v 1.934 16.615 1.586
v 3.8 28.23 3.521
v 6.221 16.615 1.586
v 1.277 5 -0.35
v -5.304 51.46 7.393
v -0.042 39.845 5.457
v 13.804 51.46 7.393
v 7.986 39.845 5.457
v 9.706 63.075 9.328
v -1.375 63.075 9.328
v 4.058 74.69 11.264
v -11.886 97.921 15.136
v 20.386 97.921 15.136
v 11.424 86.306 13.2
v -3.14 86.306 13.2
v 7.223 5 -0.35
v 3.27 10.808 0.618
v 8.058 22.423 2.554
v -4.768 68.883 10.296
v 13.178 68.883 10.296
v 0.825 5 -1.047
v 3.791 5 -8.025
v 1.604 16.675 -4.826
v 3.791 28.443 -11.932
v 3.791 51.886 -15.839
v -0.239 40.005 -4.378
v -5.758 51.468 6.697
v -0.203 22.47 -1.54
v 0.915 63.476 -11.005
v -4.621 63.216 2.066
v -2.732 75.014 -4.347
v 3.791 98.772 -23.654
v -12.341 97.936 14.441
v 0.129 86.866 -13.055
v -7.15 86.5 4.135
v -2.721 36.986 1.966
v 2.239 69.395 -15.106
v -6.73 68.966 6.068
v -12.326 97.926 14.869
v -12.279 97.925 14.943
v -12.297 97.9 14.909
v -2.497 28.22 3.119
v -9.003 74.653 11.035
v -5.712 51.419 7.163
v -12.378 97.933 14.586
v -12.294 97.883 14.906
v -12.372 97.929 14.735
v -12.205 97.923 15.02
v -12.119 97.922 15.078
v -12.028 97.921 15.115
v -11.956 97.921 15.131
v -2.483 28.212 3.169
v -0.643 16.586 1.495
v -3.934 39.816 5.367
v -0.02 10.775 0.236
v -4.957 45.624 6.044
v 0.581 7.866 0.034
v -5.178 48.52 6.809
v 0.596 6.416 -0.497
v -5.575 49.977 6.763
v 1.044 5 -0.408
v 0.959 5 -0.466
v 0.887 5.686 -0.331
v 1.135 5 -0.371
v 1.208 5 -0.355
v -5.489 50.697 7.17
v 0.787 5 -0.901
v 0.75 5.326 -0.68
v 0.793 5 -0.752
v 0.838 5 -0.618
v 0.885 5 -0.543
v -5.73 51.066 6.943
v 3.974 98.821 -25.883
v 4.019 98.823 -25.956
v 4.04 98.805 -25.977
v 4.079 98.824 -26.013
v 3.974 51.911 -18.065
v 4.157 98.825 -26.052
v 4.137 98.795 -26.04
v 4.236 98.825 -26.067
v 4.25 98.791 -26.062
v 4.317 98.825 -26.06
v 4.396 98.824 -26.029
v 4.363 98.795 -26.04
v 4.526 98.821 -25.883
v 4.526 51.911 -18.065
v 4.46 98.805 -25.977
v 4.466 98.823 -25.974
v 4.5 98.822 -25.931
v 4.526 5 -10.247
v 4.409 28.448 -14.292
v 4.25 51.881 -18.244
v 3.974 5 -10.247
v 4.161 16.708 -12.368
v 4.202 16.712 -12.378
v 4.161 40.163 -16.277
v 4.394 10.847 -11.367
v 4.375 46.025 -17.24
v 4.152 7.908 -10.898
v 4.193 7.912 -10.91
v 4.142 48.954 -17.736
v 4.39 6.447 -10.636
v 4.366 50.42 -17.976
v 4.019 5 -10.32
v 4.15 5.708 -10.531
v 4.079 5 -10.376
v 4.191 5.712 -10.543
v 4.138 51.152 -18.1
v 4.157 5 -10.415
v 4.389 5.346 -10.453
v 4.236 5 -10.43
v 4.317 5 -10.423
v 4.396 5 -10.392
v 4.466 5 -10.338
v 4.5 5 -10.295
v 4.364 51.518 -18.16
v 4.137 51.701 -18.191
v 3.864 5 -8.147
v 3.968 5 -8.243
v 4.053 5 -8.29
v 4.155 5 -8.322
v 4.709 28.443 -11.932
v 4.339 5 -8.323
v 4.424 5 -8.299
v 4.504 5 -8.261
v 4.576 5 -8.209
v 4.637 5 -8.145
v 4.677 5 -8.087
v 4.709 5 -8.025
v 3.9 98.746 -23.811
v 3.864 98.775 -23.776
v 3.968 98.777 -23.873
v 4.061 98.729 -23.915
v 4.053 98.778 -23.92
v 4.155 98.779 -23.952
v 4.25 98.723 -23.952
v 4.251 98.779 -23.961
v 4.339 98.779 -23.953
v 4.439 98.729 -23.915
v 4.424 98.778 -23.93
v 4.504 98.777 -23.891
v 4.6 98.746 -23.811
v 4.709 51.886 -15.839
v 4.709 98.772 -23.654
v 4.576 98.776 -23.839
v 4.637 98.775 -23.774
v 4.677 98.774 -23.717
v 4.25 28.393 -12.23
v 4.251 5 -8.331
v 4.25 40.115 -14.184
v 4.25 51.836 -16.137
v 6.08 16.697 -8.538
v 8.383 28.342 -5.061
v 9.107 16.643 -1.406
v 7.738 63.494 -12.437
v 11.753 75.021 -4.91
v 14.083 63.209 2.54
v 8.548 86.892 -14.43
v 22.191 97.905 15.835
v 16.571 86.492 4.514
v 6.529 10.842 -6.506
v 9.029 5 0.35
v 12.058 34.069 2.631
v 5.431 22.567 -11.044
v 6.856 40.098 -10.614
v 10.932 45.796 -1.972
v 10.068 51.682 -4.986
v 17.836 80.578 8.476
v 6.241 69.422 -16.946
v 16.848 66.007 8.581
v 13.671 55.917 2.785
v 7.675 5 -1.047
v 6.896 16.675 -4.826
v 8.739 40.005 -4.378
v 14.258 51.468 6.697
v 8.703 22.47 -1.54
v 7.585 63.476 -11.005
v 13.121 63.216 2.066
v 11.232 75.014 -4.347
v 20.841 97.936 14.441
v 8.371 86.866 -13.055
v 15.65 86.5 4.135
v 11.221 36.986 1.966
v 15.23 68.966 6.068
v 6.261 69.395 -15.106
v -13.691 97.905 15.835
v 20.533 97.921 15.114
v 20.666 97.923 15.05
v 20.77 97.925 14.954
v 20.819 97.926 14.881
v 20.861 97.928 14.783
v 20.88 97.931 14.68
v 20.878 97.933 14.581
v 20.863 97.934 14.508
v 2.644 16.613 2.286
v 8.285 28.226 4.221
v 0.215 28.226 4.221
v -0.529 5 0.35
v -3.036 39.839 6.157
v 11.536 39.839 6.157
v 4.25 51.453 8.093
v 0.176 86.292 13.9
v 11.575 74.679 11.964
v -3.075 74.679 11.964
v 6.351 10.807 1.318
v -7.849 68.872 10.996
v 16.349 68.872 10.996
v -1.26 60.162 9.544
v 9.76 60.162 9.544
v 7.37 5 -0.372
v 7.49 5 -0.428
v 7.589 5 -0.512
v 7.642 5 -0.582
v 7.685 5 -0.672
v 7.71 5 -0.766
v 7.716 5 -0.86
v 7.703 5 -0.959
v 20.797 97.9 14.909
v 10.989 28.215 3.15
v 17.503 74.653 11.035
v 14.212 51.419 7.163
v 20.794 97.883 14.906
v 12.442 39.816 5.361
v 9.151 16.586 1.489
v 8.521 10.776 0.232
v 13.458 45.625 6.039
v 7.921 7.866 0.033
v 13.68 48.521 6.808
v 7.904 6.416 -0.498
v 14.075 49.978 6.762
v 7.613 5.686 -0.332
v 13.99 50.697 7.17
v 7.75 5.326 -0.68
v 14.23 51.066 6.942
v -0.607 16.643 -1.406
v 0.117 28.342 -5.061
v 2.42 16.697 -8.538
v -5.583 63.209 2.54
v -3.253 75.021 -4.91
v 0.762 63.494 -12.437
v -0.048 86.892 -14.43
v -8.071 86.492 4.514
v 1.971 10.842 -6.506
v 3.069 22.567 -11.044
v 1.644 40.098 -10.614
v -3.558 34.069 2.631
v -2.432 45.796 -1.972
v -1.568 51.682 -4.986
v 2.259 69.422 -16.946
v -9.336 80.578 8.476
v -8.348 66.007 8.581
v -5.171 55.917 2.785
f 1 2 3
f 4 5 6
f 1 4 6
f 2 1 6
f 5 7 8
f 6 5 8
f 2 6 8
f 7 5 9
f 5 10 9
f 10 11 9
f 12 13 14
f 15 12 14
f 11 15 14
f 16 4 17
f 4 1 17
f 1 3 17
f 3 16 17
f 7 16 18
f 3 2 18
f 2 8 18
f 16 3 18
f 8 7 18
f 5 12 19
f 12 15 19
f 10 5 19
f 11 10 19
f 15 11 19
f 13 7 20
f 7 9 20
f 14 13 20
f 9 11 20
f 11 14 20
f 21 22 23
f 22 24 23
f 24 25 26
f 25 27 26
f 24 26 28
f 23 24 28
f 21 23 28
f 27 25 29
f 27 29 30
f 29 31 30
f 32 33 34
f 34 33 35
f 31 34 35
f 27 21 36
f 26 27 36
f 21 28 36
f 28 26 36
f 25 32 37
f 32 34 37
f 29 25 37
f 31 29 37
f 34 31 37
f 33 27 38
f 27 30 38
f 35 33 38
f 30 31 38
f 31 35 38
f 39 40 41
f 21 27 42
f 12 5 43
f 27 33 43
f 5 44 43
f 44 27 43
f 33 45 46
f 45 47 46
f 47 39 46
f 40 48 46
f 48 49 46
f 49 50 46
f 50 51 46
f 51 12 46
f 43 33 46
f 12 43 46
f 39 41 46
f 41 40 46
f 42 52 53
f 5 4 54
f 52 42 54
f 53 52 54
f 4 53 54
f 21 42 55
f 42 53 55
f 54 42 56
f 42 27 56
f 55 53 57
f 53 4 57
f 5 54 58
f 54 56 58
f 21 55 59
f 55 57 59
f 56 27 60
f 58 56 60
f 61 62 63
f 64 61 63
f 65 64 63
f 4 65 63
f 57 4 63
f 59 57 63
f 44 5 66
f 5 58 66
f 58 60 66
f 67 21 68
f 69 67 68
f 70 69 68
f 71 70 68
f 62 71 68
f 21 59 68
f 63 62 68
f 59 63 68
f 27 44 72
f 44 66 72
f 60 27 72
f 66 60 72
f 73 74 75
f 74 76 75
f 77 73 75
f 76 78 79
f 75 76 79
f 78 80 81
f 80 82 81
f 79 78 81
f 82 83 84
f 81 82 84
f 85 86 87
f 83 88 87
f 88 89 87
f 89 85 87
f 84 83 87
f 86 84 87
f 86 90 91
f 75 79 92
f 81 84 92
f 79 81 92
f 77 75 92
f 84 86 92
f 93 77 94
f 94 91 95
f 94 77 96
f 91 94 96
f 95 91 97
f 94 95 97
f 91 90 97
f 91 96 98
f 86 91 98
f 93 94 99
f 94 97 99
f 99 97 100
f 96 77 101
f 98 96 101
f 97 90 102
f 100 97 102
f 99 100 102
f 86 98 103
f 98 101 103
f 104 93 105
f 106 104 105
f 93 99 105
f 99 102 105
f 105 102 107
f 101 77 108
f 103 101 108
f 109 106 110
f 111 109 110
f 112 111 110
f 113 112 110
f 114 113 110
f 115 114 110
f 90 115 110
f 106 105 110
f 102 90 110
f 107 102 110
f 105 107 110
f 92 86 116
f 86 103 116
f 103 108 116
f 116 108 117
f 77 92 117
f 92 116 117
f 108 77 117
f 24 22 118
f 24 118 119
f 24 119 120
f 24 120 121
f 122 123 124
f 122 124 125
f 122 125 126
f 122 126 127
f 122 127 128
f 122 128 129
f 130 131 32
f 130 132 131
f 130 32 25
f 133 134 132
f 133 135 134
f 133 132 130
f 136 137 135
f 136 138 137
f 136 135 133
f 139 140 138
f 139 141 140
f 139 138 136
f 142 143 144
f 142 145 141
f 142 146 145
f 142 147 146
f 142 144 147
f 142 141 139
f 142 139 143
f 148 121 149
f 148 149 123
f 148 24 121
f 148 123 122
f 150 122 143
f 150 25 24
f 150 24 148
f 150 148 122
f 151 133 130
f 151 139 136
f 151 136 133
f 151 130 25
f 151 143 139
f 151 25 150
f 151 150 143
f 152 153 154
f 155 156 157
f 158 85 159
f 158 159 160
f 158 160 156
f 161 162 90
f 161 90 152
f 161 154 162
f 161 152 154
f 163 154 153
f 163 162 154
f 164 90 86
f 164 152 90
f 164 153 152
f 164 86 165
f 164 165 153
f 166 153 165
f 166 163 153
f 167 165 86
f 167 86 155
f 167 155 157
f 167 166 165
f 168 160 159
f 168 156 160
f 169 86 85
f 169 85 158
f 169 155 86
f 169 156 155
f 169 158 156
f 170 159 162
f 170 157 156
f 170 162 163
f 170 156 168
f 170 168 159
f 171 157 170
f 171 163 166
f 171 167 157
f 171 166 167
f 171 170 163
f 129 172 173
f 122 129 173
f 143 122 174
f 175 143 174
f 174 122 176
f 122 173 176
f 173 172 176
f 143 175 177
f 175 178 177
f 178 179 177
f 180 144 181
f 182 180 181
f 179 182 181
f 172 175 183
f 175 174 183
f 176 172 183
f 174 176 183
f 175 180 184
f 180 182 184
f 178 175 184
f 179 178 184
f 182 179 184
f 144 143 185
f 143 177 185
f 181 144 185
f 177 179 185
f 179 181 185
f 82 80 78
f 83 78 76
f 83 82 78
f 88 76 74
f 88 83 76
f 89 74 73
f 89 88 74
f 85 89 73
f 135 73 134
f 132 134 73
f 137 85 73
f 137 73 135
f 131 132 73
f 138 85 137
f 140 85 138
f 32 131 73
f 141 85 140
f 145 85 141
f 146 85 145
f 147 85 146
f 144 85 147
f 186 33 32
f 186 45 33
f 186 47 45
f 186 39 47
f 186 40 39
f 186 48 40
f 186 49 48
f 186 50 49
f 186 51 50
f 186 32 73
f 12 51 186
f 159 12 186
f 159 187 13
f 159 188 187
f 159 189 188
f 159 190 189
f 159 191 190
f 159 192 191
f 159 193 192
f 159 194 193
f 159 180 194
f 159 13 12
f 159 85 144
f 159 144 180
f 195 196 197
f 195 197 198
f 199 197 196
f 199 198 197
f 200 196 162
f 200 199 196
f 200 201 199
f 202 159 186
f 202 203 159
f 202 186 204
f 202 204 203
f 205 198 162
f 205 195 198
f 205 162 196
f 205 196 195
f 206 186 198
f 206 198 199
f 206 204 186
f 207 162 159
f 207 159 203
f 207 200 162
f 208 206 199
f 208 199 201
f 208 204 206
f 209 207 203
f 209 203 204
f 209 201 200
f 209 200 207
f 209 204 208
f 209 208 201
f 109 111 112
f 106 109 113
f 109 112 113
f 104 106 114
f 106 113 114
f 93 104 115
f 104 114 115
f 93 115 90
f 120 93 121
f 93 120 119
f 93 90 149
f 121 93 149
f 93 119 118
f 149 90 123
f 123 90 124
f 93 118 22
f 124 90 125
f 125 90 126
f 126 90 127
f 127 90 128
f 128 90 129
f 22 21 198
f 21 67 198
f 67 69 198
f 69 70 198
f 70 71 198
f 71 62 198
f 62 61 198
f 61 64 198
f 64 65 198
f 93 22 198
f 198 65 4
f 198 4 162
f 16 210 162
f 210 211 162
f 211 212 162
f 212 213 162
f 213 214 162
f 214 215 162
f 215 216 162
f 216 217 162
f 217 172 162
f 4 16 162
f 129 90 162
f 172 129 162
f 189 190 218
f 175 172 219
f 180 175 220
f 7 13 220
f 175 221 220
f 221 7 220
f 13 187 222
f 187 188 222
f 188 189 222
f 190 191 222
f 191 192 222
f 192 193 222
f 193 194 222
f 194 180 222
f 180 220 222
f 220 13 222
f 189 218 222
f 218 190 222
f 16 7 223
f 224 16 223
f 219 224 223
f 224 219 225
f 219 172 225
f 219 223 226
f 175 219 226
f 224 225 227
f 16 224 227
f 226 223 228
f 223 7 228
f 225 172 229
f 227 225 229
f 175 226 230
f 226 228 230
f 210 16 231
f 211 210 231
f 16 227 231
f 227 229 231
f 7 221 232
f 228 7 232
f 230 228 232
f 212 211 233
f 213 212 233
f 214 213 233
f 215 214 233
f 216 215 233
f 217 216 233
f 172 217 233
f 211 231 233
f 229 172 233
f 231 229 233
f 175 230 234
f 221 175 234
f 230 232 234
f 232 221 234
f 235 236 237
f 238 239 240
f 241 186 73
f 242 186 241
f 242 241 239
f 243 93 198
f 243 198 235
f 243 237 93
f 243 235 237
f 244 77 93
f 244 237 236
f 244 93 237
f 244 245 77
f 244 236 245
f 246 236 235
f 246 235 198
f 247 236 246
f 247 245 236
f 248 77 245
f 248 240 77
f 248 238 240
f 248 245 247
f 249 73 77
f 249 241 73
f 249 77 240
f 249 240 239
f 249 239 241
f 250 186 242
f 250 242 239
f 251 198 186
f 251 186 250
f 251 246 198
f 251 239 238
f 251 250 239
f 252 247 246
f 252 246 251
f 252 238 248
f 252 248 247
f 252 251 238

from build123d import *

# Parameters (mm, degrees)
FILLET1_R = 0.5
FILLET3_R = 0.3


with BuildPart() as part:
    # Sketch3 → Loft1 section 0
    with BuildSketch(Plane(origin=(0, 5, 0), x_dir=(1, 0, 0), z_dir=(0, 1, 0))):
        Polygon((4.25, 10.894818804), (-0.529047992, -0.35), (9.029047992, -0.35), align=None)
    # Sketch4 → Loft1 section 1
    with BuildSketch(Plane(origin=(0, 98.205572967, 2.155983202), x_dir=(-0.999633121, -0.000594485, 0.027078956), z_dir=(0, -0.999759103, -0.021948488))):
        Polygon((-5.025697058, 28.570776588), (14.056488149, -13.306873869), (-21.81216364, -14.278750127), align=None)
    loft()

    # Sketch3<411> → Cut-Loft1 section 0
    with BuildSketch(Plane(origin=(0, 5, 0), x_dir=(1, 0, 0), z_dir=(0, 1, 0))):
        Polygon((4.25, 9.105181196), (0.529047992, 0.35), (7.970952008, 0.35), align=None)
    # Sketch4<174> → Cut-Loft1 section 1
    with BuildSketch(Plane(origin=(0, 98.205572967, 2.155983202), x_dir=(-0.999633121, -0.000594485, 0.027078956), z_dir=(0, -0.999759103, -0.021948488))):
        Polygon((-4.977063106, 26.775862609), (12.981432828, -12.635746037), (-20.775027993, -13.550391589), align=None)
    loft(mode=Mode.SUBTRACT)

    # Fillet1
    fillet1_edges = [part.edges().sort_by_distance(p)[0] for p in [
        (-6.05268848, 51.460310962, 7.392787153),
        (14.55268848, 51.460310962, 7.392787153),
        (4.25, 51.898002922, -16.921781459),
    ]]
    fillet(fillet1_edges, radius=FILLET1_R)

    # Fillet3
    fillet3_edges = [part.edges().sort_by_distance(p)[0] for p in [
        (4.25, 51.917707976, -18.714170357),
    ]]
    fillet(fillet3_edges, radius=FILLET3_R)


solid = part.part
